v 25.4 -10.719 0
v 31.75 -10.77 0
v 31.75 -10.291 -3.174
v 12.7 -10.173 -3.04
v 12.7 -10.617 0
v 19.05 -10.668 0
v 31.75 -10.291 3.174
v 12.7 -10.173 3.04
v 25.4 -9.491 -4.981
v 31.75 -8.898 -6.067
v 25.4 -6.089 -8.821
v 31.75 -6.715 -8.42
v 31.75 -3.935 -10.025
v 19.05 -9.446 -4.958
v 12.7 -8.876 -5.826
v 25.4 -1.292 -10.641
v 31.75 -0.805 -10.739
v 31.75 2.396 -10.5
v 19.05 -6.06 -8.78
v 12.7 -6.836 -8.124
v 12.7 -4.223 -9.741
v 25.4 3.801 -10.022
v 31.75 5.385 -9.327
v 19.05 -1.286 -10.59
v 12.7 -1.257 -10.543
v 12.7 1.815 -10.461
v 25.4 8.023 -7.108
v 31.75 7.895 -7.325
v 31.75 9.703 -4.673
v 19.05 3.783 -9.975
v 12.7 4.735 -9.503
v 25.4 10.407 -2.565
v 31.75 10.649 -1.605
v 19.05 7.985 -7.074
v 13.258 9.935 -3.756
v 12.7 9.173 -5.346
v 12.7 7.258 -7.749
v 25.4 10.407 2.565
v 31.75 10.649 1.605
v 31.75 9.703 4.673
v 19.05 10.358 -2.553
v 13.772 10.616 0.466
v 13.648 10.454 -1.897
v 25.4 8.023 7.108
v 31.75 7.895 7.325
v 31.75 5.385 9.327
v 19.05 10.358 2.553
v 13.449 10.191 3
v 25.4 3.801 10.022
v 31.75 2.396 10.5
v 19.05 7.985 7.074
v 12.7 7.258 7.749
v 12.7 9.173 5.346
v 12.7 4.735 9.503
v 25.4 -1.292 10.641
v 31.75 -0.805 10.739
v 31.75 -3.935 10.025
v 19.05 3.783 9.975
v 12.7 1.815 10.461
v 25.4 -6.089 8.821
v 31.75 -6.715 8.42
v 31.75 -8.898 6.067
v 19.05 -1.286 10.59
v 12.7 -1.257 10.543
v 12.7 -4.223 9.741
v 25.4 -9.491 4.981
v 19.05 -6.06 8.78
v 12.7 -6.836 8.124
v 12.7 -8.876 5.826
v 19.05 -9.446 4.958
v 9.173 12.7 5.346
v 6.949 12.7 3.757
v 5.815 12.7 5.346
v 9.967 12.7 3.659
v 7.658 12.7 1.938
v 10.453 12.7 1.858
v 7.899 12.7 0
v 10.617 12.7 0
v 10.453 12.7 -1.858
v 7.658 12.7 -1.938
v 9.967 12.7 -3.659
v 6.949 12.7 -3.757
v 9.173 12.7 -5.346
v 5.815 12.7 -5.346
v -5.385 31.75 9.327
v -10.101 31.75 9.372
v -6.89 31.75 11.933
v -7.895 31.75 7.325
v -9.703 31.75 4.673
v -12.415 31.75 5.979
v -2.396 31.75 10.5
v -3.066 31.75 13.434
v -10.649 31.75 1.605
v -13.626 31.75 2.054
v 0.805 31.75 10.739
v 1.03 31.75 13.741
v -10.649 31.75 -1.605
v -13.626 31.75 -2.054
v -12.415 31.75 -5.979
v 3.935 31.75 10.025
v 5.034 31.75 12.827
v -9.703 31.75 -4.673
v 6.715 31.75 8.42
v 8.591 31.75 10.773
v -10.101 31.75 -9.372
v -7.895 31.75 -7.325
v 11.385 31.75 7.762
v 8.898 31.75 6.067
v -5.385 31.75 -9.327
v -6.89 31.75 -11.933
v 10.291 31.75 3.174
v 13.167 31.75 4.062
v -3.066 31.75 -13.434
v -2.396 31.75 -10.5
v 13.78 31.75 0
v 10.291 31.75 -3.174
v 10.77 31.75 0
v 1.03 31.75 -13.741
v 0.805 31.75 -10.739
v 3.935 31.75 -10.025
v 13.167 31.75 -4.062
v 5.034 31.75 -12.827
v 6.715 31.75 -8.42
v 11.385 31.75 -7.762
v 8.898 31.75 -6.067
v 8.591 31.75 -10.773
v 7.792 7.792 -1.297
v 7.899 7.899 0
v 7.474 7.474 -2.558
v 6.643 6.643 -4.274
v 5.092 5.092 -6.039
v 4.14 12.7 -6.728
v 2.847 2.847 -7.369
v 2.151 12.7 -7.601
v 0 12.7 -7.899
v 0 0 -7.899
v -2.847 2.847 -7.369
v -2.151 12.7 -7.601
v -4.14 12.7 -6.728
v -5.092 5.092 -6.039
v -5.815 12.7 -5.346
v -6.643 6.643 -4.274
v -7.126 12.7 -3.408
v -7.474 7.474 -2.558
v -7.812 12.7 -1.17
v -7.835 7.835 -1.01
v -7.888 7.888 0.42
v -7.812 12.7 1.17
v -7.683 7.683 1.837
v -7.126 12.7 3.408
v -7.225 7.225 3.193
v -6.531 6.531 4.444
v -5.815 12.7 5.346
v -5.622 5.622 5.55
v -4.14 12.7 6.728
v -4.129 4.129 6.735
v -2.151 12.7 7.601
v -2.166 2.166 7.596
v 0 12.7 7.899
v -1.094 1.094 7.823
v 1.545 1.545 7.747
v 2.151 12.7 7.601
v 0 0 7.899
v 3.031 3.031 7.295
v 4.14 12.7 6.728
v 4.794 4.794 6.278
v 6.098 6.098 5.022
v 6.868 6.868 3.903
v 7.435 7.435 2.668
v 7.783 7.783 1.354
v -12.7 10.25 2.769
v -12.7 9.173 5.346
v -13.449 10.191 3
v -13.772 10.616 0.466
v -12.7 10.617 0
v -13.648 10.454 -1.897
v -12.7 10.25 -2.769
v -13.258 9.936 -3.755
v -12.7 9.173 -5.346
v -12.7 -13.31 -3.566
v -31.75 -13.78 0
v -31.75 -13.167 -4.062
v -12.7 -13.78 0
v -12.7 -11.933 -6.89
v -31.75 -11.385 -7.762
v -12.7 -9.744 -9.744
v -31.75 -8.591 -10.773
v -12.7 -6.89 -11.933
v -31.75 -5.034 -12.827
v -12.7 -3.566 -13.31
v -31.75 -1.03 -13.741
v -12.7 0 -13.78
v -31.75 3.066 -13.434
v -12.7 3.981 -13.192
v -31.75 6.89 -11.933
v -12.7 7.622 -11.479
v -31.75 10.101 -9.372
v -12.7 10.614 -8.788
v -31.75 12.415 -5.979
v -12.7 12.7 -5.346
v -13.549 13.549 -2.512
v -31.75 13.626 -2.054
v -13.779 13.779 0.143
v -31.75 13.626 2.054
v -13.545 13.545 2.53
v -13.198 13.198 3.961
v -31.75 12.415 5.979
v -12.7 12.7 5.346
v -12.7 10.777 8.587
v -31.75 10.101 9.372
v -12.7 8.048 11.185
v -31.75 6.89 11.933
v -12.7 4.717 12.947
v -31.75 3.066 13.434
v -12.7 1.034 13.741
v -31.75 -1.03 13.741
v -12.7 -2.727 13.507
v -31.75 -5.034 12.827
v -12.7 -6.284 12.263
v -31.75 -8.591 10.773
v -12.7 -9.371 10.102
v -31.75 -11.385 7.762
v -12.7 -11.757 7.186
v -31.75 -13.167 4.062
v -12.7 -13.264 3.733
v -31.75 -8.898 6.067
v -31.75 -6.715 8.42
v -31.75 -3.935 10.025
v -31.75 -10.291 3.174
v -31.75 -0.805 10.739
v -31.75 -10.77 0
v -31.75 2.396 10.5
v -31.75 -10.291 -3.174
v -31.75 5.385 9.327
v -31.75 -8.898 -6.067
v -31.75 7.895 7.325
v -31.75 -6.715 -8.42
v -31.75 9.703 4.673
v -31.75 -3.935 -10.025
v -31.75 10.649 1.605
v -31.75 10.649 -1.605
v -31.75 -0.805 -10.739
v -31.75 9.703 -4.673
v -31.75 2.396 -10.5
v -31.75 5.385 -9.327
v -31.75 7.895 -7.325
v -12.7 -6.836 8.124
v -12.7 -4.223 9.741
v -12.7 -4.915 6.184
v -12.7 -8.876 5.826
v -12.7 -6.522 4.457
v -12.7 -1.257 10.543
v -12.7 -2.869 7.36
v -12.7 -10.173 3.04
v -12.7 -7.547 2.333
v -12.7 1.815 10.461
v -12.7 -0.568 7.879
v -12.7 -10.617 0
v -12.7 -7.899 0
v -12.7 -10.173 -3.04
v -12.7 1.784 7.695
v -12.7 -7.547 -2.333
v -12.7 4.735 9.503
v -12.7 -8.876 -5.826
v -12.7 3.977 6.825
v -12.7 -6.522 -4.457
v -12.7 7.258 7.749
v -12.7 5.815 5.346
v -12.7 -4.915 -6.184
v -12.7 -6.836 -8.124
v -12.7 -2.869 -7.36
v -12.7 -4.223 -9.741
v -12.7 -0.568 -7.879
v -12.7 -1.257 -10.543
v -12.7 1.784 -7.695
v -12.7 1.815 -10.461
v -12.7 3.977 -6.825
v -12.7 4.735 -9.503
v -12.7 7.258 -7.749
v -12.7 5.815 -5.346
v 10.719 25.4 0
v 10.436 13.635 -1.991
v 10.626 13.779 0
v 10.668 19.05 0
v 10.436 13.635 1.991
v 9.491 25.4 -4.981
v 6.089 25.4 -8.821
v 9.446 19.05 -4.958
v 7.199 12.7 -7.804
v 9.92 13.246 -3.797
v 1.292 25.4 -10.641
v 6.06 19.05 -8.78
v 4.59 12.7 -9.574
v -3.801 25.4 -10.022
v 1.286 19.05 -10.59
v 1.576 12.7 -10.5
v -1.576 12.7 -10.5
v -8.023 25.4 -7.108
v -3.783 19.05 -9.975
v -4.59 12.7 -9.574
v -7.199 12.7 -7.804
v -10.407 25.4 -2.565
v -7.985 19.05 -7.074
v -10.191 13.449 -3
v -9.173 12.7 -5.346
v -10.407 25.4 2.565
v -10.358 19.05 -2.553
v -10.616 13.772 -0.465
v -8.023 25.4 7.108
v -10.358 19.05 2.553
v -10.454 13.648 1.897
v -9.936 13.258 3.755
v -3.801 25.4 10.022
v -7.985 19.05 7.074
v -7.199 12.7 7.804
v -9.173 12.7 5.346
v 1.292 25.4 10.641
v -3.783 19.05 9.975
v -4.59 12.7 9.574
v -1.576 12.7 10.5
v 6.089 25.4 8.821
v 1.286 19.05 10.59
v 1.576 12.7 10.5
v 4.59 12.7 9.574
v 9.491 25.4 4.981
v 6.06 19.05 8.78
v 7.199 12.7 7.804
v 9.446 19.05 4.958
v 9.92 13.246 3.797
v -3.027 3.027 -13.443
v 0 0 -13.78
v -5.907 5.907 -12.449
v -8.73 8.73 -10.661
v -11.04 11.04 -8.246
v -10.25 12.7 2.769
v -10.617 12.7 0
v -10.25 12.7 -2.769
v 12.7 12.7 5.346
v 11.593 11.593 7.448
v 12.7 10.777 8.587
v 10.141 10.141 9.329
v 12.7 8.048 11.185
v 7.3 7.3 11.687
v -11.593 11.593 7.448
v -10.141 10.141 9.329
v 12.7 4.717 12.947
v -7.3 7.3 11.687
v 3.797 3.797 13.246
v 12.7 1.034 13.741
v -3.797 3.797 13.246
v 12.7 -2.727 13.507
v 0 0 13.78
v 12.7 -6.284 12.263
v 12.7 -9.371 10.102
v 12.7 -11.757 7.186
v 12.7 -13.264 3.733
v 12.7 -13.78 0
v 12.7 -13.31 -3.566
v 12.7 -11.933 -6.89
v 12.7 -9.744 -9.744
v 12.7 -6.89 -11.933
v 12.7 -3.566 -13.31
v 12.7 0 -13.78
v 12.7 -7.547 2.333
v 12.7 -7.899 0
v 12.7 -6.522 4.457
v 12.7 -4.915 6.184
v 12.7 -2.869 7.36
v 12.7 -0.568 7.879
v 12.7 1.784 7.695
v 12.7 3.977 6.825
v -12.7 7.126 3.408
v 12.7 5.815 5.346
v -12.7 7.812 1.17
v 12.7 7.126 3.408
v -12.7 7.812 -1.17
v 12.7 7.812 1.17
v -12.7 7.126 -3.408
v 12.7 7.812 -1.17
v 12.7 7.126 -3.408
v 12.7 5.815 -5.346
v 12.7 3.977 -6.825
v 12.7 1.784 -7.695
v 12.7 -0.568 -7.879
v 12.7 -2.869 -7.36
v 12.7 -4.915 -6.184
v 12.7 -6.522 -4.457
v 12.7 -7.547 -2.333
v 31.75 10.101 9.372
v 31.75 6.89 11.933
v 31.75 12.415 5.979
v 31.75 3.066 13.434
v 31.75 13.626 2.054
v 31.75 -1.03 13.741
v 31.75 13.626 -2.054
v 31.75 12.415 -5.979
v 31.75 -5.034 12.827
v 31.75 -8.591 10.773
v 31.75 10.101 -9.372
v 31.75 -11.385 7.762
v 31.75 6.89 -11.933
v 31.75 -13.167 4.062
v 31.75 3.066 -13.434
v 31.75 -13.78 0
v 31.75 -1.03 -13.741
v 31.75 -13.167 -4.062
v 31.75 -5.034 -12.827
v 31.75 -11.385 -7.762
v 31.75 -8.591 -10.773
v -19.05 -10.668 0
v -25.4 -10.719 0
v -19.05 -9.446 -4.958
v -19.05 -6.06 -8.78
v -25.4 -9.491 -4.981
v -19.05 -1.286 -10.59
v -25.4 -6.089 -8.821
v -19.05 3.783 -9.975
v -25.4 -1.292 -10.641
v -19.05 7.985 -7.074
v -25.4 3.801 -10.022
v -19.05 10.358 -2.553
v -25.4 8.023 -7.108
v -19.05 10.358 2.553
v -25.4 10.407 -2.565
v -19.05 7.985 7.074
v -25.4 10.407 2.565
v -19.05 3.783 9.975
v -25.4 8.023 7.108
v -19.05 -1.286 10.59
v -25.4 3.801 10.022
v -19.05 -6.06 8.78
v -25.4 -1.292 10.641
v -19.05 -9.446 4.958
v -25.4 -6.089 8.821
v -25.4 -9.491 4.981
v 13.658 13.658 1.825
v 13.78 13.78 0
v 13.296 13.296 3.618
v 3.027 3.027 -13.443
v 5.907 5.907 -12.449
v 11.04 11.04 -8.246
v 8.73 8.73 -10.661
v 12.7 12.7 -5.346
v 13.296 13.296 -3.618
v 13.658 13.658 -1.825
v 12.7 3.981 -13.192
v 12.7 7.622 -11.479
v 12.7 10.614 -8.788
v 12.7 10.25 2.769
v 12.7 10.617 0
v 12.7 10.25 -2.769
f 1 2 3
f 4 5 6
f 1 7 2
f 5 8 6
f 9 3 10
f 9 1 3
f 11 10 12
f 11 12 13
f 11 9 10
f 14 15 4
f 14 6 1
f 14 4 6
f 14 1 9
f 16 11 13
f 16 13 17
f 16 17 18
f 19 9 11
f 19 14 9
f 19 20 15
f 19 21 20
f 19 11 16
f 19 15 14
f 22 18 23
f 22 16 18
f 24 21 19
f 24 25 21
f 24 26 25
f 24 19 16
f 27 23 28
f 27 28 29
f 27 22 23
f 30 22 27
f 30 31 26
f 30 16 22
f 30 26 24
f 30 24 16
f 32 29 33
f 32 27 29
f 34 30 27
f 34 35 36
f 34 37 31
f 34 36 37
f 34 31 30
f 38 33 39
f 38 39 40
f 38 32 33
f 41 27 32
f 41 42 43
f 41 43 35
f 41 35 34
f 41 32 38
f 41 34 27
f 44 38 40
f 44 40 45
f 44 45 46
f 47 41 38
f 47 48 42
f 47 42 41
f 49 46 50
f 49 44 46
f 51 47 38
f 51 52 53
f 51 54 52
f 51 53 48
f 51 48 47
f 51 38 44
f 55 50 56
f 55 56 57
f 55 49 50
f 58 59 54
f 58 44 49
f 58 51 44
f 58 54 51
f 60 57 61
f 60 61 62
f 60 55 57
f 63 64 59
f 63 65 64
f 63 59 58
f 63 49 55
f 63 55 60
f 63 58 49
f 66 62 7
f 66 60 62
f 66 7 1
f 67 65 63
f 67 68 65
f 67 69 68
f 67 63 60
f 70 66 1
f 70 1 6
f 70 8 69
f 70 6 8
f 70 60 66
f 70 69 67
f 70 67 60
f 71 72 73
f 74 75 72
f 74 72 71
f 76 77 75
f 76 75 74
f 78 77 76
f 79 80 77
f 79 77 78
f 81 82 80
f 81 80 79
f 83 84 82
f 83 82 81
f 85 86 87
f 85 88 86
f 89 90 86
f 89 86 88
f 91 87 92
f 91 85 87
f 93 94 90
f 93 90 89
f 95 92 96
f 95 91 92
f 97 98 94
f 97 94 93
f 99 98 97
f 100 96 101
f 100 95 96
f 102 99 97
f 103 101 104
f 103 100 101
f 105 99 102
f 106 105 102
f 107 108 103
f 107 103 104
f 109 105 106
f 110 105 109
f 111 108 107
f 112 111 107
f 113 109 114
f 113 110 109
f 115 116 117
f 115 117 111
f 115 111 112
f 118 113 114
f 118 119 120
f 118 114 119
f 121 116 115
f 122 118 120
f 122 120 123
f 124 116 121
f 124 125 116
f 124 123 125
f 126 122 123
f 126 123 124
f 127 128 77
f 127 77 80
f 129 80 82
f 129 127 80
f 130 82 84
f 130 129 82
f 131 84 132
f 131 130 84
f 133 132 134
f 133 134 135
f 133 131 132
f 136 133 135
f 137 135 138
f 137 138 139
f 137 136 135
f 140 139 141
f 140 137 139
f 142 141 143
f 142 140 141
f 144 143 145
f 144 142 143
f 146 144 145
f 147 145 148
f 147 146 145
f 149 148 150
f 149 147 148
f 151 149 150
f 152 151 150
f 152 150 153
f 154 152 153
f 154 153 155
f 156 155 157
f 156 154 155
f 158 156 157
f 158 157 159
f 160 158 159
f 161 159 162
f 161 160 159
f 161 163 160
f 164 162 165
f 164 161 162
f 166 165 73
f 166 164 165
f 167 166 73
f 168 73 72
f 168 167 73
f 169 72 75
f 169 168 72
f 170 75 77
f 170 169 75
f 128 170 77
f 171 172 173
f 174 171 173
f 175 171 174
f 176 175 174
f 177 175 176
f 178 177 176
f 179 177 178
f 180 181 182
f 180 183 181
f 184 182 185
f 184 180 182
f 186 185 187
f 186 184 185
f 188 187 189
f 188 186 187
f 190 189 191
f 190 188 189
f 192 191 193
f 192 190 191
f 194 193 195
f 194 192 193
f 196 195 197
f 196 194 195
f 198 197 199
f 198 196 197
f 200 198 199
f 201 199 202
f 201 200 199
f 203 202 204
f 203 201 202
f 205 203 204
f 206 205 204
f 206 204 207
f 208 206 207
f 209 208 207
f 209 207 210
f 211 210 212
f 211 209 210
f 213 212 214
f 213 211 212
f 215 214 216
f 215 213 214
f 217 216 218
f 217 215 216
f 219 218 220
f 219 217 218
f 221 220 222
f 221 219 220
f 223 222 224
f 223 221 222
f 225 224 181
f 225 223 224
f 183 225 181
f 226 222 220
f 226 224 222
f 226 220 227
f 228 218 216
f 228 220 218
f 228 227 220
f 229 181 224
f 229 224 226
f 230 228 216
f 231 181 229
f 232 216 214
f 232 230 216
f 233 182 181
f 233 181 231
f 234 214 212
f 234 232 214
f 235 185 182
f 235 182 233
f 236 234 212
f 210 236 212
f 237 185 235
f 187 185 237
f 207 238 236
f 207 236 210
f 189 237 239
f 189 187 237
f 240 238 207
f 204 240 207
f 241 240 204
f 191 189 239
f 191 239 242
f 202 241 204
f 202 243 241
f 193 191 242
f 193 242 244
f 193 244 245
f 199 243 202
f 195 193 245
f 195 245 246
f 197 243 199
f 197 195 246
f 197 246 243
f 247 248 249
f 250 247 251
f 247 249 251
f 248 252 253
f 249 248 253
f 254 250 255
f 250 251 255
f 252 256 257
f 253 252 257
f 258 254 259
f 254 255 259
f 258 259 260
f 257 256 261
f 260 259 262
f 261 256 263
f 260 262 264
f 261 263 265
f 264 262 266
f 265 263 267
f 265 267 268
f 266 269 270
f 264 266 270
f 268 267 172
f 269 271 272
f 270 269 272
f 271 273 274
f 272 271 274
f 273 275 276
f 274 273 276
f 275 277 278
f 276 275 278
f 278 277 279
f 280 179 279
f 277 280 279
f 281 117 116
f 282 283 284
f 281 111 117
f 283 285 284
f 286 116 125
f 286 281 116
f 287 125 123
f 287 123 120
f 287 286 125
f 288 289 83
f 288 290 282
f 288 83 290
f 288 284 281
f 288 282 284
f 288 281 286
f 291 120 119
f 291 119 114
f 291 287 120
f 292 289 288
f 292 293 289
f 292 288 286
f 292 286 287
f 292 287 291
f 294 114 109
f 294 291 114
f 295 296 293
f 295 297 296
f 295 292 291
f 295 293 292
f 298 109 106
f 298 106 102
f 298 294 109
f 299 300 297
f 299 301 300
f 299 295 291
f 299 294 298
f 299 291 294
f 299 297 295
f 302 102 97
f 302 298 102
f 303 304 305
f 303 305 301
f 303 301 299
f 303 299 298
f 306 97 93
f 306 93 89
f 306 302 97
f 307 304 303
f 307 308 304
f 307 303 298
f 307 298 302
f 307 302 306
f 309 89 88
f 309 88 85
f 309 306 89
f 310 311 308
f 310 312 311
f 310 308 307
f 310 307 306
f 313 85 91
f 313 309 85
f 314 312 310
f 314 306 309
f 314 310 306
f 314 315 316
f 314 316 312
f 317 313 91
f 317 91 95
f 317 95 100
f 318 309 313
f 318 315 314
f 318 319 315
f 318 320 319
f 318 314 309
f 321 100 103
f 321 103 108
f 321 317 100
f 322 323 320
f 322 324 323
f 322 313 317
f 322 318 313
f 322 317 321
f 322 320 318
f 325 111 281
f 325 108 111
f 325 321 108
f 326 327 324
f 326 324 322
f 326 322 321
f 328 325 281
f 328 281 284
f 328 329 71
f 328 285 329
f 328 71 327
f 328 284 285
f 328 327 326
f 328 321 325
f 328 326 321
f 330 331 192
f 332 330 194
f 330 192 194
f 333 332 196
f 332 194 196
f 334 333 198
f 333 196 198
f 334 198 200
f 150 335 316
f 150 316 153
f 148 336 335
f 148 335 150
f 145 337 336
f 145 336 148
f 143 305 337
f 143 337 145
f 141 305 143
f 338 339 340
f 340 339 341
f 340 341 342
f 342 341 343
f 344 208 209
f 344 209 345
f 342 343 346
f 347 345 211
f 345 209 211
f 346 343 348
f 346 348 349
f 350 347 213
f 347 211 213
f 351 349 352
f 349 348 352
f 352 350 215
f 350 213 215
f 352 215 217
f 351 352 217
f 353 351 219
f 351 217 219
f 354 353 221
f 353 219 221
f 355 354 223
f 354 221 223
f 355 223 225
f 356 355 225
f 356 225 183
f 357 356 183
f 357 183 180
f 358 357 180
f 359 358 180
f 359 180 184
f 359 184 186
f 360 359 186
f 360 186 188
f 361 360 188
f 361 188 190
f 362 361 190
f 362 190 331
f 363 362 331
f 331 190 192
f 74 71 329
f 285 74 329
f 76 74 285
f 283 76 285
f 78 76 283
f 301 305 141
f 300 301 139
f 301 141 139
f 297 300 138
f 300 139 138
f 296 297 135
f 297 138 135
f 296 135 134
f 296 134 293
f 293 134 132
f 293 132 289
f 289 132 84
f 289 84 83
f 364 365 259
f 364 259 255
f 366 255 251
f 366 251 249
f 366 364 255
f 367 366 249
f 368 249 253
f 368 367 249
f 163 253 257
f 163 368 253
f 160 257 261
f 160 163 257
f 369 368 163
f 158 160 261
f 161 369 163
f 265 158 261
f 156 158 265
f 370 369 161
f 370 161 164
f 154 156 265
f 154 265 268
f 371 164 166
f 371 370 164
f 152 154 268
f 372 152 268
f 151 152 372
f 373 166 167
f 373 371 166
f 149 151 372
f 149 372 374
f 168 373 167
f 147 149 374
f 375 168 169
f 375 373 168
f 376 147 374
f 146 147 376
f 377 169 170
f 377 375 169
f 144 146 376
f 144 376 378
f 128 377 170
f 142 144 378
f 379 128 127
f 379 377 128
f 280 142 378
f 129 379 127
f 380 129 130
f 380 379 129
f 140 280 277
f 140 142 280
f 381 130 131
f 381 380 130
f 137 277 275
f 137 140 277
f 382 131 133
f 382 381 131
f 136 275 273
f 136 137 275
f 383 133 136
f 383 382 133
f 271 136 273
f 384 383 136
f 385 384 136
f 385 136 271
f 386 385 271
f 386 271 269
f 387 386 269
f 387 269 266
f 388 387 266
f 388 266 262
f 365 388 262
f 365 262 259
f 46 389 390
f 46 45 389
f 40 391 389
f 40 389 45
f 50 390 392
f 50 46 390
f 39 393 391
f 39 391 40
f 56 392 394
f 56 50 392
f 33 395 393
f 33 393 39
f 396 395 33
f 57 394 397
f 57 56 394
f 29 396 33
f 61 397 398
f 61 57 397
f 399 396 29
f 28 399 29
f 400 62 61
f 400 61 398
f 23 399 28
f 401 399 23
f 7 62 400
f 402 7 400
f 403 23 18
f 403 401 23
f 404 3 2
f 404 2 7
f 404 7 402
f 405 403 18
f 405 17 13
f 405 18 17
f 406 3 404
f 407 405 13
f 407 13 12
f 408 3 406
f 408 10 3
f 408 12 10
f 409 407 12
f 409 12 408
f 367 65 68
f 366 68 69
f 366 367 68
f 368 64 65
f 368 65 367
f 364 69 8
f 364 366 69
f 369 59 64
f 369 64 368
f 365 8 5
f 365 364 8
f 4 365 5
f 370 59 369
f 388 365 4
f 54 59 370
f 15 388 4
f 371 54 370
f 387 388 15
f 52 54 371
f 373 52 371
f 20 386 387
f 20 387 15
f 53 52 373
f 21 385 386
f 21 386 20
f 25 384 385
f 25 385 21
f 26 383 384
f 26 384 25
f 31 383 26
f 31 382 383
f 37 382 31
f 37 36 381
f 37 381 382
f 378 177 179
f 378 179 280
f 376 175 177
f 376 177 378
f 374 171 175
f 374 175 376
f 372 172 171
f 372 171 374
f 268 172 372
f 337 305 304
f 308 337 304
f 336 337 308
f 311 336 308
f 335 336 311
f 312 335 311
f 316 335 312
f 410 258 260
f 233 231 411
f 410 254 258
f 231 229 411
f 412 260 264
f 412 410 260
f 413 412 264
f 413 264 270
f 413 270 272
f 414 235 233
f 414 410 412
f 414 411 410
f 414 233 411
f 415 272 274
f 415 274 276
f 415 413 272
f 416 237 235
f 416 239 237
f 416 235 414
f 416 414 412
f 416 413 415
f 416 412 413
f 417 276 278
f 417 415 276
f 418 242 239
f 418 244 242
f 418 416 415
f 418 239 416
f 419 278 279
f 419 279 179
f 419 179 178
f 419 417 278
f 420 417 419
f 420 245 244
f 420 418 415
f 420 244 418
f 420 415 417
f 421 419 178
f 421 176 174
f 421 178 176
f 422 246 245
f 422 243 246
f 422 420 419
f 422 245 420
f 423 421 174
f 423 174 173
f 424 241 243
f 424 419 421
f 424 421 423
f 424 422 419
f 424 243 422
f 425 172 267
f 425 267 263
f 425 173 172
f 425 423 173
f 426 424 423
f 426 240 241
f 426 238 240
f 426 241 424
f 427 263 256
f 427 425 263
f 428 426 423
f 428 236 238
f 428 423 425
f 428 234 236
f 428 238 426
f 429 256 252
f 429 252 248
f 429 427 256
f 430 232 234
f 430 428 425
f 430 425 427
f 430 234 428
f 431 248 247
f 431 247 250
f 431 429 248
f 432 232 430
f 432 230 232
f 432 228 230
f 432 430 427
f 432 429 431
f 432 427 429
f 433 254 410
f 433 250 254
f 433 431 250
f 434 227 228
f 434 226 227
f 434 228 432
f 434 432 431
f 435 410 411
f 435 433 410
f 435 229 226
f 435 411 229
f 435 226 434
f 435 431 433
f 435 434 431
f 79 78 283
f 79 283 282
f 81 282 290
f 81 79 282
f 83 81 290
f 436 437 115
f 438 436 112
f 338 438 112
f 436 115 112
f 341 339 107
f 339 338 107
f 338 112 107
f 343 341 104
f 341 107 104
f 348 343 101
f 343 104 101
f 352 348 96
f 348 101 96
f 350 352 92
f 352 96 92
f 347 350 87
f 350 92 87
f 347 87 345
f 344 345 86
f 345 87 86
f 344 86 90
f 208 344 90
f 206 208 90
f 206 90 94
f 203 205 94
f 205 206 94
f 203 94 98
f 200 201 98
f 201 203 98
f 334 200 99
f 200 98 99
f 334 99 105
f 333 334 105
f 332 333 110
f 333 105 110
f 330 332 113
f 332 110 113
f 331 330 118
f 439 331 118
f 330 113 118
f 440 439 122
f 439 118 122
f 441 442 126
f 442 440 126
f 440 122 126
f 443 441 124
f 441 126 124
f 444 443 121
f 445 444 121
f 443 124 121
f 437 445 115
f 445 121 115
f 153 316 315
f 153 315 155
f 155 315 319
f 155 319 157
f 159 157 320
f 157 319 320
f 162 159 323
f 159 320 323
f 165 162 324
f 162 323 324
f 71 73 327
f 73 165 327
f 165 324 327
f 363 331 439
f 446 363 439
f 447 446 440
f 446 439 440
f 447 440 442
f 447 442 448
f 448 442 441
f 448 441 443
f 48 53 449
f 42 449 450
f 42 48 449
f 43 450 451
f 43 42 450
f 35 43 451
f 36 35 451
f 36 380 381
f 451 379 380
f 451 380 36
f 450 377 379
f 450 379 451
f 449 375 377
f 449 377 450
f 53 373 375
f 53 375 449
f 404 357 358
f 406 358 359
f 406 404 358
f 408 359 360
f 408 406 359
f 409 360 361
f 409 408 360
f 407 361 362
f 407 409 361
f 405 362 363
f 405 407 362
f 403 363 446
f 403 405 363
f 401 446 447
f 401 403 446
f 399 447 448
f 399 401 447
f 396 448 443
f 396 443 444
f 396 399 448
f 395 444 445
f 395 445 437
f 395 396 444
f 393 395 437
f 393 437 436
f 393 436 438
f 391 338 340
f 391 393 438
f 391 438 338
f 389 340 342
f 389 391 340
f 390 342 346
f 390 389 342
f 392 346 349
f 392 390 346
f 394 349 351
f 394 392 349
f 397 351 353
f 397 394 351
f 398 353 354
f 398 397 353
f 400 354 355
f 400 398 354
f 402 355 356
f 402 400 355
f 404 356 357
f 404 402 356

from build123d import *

# Parameters (mm, degrees)
SKETCH4_R           = 13.7795
BOSS_EXTRUDE1_DEPTH = 25.4
SKETCH5_R           = 13.7795
BOSS_EXTRUDE2_DEPTH = 12.7


with BuildPart() as part:
    # Sketch1 → Revolve1 (revolve)
    with BuildSketch(Plane.XY):
        Polygon((-31.75, -13.7795), (-12.7, -13.7795), (-12.7, -10.6172), (-31.75, -10.7696), align=None)
        Polygon((31.75, -10.7696), (12.7, -10.6172), (12.7, -13.7795), (31.75, -13.7795), align=None)
    revolve(axis=Axis((-31.75, 0, 0), (1, 0, 0)))



with BuildPart() as body_2:
    # Sketch2 → Revolve2 (revolve)
    with BuildSketch(Plane.XY):
        Polygon((10.7696, 31.75), (10.6172, 12.7), (13.7795, 12.7), (13.7795, 31.75), align=None)
    revolve(axis=Axis((0, 0, 0), (0, 1, 0)))


with BuildPart() as part_1:
    add(part.part)

    add(body_2.part)  # Boss-Extrude1 merges body 2
    # Sketch4 → Boss-Extrude1 (add)
    with BuildSketch(Plane(origin=(-12.7, 0, 0), x_dir=(0, 0, -1), z_dir=(1, 0, 0))):
        Circle(SKETCH4_R)
    extrude(amount=BOSS_EXTRUDE1_DEPTH)

    # Sketch5 → Boss-Extrude2 (add)
    with BuildSketch(Plane.XZ.offset(-12.7)):
        Circle(SKETCH5_R)
    extrude(amount=BOSS_EXTRUDE2_DEPTH)

    # Sketch6 → Cut-Revolve1 (revolve, cut)
    with BuildSketch(Plane.XY):
        Polygon((-31.75, -10.7696), (-12.7, -10.6172), (-12.7, -7.8994), (12.7, -7.8994), (12.7, -10.6172), (31.75, -10.7696), (31.75, 0), (-31.75, 0), align=None)
    revolve(axis=Axis((31.75, 0, 0), (-1, 0, 0)), mode=Mode.SUBTRACT)

    # Sketch7 → Cut-Revolve2 (revolve, cut)
    with BuildSketch(Plane.XY):
        Polygon((10.7696, 31.75), (10.6172, 12.7), (7.8994, 12.7), (7.8994, 0), (0, 0), (0, 31.75), align=None)
    revolve(axis=Axis((0, 0, 0), (0, 1, 0)), mode=Mode.SUBTRACT)


solid = part_1.part
